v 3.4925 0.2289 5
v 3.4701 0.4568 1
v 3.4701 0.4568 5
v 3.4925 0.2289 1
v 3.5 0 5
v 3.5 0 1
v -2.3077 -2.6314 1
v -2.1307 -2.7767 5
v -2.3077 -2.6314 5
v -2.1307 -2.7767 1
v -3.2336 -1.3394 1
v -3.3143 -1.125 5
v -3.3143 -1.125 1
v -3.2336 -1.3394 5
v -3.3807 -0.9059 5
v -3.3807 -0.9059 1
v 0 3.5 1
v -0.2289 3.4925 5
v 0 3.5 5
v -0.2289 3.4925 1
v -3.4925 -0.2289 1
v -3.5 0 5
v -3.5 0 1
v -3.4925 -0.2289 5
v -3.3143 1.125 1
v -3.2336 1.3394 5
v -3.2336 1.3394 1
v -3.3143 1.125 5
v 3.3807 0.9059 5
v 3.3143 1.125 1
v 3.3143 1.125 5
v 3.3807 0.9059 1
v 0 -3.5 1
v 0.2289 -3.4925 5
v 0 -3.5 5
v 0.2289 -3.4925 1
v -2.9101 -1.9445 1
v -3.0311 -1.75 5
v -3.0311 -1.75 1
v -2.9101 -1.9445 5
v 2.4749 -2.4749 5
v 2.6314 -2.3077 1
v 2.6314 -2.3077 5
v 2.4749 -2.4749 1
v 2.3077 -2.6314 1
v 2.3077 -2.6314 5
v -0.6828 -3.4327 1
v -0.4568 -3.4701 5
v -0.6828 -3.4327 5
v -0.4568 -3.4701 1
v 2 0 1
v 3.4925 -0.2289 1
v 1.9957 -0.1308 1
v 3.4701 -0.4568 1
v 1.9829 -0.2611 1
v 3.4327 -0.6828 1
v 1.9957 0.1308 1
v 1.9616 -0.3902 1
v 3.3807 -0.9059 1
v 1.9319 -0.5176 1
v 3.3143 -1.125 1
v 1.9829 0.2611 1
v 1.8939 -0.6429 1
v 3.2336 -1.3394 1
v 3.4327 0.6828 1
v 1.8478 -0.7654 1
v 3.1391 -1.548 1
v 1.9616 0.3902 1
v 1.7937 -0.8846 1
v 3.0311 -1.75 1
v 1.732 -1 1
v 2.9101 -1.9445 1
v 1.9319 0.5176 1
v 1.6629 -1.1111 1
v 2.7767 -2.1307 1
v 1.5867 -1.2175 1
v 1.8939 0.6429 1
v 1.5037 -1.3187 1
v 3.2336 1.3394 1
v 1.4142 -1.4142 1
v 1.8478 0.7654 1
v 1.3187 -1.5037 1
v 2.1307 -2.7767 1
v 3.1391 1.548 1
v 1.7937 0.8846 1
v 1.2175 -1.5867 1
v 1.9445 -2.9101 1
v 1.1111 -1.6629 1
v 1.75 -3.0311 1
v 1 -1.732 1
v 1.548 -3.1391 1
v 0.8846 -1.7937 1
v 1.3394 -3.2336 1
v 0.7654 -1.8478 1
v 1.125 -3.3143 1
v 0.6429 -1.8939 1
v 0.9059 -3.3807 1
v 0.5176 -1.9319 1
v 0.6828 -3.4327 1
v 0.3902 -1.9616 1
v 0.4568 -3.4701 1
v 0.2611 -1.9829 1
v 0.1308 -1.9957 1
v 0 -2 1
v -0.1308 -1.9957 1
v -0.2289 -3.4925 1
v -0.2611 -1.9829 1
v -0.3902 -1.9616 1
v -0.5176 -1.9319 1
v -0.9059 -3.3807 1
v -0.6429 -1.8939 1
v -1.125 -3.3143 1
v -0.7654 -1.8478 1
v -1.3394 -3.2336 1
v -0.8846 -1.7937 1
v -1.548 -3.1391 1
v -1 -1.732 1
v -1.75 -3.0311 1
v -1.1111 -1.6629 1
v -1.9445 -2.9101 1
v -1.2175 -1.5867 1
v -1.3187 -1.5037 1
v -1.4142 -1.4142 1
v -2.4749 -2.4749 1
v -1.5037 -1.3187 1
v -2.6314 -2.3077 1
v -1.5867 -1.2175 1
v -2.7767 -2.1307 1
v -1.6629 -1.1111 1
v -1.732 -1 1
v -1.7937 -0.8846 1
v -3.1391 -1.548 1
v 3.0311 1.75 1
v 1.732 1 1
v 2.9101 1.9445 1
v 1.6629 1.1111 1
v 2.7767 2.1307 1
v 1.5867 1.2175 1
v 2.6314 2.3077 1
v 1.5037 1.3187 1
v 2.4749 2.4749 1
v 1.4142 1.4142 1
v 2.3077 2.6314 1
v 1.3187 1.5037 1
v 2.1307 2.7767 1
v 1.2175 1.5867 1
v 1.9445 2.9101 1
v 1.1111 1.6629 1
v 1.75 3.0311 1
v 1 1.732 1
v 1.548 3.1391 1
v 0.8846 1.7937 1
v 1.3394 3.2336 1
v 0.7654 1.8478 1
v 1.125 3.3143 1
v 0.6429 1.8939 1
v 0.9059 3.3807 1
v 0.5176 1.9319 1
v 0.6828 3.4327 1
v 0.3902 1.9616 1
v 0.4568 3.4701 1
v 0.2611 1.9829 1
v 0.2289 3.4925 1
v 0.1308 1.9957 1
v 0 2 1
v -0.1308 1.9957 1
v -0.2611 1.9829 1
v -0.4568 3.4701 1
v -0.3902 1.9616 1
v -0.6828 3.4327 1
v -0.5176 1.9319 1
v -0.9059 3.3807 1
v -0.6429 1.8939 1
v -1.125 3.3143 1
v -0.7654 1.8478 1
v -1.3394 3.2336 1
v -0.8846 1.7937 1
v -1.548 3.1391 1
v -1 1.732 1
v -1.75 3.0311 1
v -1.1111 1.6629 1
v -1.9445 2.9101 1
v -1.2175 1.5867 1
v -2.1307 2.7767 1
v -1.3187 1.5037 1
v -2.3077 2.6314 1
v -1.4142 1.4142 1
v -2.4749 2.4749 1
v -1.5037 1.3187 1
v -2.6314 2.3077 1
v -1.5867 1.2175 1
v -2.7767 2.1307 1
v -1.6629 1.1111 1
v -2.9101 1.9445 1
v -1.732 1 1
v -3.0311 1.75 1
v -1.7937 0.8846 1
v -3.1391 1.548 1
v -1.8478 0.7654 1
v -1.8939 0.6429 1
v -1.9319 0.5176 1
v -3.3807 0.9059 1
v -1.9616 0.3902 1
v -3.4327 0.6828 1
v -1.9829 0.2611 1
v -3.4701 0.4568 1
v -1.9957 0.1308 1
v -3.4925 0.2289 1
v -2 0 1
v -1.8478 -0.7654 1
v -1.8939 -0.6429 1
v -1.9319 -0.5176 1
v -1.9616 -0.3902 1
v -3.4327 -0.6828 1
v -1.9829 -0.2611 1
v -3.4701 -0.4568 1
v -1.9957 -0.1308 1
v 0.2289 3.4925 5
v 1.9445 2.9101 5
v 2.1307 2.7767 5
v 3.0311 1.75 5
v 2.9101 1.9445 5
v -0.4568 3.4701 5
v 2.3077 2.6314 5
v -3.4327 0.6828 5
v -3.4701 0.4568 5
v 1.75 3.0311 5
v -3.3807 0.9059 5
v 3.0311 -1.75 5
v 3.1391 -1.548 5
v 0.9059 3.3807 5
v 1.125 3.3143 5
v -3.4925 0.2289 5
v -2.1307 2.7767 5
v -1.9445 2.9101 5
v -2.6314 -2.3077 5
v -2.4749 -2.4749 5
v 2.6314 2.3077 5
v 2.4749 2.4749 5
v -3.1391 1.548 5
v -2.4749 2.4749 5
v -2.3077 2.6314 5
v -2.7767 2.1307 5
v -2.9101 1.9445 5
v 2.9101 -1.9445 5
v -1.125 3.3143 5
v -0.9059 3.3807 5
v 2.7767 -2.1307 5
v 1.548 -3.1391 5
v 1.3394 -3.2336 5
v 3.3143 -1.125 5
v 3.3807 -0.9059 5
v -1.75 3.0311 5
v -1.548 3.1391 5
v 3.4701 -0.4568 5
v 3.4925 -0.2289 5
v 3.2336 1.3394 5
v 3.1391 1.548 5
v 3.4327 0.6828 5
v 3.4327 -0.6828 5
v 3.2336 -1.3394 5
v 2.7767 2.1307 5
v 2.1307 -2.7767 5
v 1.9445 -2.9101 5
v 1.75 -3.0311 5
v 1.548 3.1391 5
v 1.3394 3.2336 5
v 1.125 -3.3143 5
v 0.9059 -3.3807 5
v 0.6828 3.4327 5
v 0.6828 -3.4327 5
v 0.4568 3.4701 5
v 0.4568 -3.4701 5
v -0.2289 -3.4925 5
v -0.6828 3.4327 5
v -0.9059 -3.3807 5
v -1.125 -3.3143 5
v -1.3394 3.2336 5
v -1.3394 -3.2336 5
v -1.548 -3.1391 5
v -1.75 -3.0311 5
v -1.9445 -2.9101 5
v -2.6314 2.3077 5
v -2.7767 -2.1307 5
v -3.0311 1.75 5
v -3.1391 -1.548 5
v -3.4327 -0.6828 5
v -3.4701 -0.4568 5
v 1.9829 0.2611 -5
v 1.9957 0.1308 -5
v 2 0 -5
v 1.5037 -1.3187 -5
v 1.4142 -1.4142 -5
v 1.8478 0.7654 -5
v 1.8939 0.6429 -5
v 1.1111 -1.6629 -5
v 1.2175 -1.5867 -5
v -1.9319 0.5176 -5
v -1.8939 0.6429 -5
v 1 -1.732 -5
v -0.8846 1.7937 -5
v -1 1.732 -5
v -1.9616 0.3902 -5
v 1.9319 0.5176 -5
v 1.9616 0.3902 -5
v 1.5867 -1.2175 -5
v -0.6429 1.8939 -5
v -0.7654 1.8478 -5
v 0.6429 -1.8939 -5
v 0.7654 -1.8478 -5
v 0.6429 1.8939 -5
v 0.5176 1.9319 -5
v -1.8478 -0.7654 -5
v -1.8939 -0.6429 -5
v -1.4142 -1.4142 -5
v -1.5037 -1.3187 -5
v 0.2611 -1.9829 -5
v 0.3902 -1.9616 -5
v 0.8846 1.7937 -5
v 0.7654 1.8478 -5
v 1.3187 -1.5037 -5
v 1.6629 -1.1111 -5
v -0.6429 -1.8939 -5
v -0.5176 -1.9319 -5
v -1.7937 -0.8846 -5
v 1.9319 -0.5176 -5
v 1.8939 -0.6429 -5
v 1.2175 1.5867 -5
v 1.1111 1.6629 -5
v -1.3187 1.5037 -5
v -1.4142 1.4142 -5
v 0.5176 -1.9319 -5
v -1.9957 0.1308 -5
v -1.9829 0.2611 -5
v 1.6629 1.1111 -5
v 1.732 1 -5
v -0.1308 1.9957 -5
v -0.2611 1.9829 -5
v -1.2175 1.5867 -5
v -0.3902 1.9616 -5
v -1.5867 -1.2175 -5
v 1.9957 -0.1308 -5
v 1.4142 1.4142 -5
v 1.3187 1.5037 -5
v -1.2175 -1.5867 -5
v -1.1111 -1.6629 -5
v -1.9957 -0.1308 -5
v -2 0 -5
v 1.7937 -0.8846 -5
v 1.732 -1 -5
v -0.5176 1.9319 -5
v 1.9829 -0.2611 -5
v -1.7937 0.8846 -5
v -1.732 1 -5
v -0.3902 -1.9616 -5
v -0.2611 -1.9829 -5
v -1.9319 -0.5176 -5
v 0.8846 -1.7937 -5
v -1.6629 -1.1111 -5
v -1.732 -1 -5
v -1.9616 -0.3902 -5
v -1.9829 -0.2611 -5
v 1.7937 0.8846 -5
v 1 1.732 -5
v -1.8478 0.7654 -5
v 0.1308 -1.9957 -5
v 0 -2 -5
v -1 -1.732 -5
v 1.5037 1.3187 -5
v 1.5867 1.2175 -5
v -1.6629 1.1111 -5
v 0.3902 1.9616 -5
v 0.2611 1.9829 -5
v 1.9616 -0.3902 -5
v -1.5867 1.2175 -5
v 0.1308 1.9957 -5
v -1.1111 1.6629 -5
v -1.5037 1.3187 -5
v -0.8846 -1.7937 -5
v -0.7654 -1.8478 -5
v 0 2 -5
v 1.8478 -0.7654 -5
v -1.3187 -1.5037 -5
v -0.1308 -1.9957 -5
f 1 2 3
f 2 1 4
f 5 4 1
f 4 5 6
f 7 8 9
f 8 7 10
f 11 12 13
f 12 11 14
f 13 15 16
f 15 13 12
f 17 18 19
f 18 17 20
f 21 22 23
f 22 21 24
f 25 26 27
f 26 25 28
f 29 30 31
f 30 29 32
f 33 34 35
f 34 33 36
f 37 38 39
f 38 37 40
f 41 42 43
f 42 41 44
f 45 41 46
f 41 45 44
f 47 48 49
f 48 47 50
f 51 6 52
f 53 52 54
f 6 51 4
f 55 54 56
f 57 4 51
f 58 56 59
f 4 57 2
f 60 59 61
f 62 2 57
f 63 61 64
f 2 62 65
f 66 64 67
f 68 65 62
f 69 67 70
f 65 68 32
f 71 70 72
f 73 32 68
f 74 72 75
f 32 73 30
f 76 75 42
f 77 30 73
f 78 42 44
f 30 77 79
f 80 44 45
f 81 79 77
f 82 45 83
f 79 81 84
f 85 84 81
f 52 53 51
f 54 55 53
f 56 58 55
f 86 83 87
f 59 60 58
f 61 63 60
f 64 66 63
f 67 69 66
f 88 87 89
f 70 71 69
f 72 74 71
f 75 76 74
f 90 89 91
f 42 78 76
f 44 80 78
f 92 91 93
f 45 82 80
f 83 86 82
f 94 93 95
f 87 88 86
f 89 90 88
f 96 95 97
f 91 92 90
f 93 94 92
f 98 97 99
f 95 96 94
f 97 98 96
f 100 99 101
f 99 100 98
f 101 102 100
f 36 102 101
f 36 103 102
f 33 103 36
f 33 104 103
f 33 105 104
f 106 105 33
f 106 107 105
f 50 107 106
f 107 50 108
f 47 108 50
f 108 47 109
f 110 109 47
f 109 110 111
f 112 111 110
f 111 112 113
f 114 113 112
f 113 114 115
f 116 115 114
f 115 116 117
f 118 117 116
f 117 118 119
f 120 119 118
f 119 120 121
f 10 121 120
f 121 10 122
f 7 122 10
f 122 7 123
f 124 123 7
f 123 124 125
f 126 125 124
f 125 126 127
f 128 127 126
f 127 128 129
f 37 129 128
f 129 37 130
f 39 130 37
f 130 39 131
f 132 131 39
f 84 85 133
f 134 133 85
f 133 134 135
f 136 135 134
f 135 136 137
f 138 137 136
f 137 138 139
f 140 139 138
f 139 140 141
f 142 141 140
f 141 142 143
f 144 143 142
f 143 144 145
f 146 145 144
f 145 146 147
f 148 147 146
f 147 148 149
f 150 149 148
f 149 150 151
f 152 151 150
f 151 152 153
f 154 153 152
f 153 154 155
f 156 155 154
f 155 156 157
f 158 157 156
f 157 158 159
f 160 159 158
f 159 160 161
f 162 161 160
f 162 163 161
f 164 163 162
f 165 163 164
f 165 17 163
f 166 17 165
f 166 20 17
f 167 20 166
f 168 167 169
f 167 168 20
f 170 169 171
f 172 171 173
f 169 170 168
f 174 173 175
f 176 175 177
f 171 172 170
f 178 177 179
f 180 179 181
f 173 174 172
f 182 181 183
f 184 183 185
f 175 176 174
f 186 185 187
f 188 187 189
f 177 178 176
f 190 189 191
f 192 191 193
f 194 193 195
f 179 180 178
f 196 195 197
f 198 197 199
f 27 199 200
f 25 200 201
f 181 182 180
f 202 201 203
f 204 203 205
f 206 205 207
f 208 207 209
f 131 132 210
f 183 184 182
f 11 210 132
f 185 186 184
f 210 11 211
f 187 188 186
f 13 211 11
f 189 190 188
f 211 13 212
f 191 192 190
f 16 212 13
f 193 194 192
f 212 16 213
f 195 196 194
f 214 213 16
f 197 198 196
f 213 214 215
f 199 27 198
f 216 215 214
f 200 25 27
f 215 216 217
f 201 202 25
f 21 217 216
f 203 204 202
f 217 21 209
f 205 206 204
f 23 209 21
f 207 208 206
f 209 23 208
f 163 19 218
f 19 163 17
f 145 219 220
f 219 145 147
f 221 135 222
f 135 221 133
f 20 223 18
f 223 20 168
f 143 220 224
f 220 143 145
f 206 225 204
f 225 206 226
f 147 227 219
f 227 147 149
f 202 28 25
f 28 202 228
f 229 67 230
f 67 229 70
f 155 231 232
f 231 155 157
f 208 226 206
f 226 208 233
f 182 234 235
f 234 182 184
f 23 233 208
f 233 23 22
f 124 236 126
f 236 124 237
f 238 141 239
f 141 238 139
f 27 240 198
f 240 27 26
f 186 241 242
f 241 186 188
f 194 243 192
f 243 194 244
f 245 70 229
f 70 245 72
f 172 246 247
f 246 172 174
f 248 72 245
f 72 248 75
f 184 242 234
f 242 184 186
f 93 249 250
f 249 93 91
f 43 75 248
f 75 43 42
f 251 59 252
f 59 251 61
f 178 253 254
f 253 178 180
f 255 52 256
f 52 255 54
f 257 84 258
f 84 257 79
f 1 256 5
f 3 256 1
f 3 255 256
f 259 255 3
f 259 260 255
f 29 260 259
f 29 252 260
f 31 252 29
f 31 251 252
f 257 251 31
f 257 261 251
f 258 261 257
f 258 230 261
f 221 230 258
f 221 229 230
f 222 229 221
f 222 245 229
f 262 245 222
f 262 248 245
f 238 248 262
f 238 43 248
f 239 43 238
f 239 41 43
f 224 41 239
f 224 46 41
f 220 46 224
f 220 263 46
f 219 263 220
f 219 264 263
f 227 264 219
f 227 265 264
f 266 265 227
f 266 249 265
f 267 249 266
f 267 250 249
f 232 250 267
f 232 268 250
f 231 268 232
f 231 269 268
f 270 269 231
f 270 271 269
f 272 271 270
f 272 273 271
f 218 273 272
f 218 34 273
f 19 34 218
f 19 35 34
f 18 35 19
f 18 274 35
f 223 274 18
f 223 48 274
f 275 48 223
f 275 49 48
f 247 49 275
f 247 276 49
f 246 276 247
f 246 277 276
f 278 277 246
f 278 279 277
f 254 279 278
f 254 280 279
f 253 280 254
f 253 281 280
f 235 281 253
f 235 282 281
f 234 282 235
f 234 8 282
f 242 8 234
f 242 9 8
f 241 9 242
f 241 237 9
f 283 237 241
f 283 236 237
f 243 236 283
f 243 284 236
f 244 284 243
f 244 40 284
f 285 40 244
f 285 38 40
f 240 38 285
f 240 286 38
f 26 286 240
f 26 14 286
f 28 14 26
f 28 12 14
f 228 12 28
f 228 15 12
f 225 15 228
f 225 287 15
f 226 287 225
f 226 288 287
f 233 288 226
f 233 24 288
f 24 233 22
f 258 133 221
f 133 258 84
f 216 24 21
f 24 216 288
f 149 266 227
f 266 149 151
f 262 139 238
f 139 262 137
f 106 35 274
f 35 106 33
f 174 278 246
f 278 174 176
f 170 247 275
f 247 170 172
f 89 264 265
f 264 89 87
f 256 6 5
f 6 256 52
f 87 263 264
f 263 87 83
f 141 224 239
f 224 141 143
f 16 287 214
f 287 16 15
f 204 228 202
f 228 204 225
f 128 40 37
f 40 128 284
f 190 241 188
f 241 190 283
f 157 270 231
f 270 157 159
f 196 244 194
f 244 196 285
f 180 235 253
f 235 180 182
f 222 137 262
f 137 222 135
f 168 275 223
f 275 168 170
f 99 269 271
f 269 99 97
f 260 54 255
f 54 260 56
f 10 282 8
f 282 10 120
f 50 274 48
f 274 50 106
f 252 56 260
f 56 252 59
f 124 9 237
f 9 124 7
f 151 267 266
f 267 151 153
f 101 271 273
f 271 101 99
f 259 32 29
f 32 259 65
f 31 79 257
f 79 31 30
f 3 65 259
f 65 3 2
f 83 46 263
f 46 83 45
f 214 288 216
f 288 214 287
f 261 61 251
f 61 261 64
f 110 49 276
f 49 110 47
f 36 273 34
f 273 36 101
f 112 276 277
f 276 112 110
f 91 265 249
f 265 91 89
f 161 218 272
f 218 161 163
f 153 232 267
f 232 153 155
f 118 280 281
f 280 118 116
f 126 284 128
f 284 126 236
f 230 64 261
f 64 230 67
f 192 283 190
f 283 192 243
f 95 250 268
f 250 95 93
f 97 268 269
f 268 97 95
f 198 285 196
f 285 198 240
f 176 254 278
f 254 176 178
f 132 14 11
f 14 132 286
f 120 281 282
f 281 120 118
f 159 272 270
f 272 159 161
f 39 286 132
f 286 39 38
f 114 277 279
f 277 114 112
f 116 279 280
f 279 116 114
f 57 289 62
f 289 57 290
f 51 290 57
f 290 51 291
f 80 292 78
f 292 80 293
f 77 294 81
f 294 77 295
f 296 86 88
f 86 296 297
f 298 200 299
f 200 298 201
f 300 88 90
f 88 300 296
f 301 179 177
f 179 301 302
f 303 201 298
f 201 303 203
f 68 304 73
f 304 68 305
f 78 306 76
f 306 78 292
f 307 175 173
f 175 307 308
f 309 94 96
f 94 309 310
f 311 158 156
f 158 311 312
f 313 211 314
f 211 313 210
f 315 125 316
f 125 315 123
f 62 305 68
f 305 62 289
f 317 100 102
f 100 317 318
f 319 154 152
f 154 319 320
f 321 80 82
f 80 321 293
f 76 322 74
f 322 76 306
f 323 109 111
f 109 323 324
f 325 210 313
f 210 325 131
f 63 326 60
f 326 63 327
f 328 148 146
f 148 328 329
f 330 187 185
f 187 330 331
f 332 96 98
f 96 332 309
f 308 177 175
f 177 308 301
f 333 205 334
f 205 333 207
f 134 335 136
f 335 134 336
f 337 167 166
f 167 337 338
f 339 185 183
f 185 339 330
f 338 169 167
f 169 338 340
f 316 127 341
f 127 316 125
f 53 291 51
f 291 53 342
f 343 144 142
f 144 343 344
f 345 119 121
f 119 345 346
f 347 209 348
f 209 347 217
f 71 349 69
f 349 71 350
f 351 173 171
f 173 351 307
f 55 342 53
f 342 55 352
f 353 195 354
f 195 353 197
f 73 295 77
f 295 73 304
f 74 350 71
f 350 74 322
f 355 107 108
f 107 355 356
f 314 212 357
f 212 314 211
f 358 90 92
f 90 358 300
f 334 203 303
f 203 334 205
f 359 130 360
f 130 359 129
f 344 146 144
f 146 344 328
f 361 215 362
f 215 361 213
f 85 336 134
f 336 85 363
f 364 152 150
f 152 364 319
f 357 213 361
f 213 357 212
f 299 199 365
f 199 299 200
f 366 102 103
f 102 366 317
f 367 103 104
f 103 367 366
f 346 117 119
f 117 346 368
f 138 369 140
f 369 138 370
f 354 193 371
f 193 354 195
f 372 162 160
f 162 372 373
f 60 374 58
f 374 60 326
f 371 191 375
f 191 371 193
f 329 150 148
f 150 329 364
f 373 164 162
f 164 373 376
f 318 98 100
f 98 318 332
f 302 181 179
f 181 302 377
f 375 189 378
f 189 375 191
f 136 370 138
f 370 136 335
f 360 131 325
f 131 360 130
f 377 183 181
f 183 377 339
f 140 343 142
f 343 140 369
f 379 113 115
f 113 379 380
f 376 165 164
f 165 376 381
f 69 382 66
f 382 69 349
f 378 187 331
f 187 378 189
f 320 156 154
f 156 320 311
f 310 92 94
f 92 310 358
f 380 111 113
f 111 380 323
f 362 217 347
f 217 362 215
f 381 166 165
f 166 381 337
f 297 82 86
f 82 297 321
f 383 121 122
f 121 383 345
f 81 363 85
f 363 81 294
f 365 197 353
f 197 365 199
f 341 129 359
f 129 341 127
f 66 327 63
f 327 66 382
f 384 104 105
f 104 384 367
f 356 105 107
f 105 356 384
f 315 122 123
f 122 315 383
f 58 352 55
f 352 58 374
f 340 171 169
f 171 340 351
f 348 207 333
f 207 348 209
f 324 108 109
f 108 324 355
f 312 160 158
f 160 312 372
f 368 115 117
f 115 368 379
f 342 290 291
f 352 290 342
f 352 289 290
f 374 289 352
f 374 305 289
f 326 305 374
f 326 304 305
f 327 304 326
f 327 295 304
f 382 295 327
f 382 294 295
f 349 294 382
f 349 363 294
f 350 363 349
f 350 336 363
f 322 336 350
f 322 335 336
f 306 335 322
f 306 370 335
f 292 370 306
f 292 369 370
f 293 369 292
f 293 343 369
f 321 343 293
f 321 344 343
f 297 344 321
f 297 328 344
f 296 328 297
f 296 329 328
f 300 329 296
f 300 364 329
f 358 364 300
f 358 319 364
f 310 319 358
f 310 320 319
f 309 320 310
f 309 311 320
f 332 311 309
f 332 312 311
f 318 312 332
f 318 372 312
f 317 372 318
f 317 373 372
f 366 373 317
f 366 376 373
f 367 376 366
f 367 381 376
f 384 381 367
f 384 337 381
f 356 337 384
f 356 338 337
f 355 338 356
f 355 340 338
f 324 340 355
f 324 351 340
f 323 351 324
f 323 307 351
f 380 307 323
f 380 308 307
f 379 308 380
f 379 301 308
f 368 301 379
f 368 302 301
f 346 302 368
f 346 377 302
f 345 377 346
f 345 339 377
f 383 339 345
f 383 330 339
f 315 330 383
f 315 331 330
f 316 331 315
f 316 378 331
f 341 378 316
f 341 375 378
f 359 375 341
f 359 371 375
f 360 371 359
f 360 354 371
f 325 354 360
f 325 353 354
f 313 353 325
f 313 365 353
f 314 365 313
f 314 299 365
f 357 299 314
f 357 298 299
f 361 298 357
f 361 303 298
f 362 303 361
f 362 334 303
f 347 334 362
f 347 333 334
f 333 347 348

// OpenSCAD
$fn=96;

module socket_head_cap_screw(d=4.0, head_d=7.0, head_h=4.0, L=10.0, socket_d=3.0, socket_depth=2.5) {
    union() {
        translate([0,0,-L/2])
            cylinder(d=d, h=L, center=false);

        translate([0,0,L/2 - head_h])
            difference() {
                cylinder(d=head_d, h=head_h, center=false);
                translate([0,0,head_h - socket_depth])
                    cylinder(d=socket_d, h=socket_depth + 0.2, center=false);
            }
    }
}

socket_head_cap_screw(d=4.0, head_d=7.0, head_h=4.0, L=10.0, socket_d=3.0, socket_depth=2.5);
